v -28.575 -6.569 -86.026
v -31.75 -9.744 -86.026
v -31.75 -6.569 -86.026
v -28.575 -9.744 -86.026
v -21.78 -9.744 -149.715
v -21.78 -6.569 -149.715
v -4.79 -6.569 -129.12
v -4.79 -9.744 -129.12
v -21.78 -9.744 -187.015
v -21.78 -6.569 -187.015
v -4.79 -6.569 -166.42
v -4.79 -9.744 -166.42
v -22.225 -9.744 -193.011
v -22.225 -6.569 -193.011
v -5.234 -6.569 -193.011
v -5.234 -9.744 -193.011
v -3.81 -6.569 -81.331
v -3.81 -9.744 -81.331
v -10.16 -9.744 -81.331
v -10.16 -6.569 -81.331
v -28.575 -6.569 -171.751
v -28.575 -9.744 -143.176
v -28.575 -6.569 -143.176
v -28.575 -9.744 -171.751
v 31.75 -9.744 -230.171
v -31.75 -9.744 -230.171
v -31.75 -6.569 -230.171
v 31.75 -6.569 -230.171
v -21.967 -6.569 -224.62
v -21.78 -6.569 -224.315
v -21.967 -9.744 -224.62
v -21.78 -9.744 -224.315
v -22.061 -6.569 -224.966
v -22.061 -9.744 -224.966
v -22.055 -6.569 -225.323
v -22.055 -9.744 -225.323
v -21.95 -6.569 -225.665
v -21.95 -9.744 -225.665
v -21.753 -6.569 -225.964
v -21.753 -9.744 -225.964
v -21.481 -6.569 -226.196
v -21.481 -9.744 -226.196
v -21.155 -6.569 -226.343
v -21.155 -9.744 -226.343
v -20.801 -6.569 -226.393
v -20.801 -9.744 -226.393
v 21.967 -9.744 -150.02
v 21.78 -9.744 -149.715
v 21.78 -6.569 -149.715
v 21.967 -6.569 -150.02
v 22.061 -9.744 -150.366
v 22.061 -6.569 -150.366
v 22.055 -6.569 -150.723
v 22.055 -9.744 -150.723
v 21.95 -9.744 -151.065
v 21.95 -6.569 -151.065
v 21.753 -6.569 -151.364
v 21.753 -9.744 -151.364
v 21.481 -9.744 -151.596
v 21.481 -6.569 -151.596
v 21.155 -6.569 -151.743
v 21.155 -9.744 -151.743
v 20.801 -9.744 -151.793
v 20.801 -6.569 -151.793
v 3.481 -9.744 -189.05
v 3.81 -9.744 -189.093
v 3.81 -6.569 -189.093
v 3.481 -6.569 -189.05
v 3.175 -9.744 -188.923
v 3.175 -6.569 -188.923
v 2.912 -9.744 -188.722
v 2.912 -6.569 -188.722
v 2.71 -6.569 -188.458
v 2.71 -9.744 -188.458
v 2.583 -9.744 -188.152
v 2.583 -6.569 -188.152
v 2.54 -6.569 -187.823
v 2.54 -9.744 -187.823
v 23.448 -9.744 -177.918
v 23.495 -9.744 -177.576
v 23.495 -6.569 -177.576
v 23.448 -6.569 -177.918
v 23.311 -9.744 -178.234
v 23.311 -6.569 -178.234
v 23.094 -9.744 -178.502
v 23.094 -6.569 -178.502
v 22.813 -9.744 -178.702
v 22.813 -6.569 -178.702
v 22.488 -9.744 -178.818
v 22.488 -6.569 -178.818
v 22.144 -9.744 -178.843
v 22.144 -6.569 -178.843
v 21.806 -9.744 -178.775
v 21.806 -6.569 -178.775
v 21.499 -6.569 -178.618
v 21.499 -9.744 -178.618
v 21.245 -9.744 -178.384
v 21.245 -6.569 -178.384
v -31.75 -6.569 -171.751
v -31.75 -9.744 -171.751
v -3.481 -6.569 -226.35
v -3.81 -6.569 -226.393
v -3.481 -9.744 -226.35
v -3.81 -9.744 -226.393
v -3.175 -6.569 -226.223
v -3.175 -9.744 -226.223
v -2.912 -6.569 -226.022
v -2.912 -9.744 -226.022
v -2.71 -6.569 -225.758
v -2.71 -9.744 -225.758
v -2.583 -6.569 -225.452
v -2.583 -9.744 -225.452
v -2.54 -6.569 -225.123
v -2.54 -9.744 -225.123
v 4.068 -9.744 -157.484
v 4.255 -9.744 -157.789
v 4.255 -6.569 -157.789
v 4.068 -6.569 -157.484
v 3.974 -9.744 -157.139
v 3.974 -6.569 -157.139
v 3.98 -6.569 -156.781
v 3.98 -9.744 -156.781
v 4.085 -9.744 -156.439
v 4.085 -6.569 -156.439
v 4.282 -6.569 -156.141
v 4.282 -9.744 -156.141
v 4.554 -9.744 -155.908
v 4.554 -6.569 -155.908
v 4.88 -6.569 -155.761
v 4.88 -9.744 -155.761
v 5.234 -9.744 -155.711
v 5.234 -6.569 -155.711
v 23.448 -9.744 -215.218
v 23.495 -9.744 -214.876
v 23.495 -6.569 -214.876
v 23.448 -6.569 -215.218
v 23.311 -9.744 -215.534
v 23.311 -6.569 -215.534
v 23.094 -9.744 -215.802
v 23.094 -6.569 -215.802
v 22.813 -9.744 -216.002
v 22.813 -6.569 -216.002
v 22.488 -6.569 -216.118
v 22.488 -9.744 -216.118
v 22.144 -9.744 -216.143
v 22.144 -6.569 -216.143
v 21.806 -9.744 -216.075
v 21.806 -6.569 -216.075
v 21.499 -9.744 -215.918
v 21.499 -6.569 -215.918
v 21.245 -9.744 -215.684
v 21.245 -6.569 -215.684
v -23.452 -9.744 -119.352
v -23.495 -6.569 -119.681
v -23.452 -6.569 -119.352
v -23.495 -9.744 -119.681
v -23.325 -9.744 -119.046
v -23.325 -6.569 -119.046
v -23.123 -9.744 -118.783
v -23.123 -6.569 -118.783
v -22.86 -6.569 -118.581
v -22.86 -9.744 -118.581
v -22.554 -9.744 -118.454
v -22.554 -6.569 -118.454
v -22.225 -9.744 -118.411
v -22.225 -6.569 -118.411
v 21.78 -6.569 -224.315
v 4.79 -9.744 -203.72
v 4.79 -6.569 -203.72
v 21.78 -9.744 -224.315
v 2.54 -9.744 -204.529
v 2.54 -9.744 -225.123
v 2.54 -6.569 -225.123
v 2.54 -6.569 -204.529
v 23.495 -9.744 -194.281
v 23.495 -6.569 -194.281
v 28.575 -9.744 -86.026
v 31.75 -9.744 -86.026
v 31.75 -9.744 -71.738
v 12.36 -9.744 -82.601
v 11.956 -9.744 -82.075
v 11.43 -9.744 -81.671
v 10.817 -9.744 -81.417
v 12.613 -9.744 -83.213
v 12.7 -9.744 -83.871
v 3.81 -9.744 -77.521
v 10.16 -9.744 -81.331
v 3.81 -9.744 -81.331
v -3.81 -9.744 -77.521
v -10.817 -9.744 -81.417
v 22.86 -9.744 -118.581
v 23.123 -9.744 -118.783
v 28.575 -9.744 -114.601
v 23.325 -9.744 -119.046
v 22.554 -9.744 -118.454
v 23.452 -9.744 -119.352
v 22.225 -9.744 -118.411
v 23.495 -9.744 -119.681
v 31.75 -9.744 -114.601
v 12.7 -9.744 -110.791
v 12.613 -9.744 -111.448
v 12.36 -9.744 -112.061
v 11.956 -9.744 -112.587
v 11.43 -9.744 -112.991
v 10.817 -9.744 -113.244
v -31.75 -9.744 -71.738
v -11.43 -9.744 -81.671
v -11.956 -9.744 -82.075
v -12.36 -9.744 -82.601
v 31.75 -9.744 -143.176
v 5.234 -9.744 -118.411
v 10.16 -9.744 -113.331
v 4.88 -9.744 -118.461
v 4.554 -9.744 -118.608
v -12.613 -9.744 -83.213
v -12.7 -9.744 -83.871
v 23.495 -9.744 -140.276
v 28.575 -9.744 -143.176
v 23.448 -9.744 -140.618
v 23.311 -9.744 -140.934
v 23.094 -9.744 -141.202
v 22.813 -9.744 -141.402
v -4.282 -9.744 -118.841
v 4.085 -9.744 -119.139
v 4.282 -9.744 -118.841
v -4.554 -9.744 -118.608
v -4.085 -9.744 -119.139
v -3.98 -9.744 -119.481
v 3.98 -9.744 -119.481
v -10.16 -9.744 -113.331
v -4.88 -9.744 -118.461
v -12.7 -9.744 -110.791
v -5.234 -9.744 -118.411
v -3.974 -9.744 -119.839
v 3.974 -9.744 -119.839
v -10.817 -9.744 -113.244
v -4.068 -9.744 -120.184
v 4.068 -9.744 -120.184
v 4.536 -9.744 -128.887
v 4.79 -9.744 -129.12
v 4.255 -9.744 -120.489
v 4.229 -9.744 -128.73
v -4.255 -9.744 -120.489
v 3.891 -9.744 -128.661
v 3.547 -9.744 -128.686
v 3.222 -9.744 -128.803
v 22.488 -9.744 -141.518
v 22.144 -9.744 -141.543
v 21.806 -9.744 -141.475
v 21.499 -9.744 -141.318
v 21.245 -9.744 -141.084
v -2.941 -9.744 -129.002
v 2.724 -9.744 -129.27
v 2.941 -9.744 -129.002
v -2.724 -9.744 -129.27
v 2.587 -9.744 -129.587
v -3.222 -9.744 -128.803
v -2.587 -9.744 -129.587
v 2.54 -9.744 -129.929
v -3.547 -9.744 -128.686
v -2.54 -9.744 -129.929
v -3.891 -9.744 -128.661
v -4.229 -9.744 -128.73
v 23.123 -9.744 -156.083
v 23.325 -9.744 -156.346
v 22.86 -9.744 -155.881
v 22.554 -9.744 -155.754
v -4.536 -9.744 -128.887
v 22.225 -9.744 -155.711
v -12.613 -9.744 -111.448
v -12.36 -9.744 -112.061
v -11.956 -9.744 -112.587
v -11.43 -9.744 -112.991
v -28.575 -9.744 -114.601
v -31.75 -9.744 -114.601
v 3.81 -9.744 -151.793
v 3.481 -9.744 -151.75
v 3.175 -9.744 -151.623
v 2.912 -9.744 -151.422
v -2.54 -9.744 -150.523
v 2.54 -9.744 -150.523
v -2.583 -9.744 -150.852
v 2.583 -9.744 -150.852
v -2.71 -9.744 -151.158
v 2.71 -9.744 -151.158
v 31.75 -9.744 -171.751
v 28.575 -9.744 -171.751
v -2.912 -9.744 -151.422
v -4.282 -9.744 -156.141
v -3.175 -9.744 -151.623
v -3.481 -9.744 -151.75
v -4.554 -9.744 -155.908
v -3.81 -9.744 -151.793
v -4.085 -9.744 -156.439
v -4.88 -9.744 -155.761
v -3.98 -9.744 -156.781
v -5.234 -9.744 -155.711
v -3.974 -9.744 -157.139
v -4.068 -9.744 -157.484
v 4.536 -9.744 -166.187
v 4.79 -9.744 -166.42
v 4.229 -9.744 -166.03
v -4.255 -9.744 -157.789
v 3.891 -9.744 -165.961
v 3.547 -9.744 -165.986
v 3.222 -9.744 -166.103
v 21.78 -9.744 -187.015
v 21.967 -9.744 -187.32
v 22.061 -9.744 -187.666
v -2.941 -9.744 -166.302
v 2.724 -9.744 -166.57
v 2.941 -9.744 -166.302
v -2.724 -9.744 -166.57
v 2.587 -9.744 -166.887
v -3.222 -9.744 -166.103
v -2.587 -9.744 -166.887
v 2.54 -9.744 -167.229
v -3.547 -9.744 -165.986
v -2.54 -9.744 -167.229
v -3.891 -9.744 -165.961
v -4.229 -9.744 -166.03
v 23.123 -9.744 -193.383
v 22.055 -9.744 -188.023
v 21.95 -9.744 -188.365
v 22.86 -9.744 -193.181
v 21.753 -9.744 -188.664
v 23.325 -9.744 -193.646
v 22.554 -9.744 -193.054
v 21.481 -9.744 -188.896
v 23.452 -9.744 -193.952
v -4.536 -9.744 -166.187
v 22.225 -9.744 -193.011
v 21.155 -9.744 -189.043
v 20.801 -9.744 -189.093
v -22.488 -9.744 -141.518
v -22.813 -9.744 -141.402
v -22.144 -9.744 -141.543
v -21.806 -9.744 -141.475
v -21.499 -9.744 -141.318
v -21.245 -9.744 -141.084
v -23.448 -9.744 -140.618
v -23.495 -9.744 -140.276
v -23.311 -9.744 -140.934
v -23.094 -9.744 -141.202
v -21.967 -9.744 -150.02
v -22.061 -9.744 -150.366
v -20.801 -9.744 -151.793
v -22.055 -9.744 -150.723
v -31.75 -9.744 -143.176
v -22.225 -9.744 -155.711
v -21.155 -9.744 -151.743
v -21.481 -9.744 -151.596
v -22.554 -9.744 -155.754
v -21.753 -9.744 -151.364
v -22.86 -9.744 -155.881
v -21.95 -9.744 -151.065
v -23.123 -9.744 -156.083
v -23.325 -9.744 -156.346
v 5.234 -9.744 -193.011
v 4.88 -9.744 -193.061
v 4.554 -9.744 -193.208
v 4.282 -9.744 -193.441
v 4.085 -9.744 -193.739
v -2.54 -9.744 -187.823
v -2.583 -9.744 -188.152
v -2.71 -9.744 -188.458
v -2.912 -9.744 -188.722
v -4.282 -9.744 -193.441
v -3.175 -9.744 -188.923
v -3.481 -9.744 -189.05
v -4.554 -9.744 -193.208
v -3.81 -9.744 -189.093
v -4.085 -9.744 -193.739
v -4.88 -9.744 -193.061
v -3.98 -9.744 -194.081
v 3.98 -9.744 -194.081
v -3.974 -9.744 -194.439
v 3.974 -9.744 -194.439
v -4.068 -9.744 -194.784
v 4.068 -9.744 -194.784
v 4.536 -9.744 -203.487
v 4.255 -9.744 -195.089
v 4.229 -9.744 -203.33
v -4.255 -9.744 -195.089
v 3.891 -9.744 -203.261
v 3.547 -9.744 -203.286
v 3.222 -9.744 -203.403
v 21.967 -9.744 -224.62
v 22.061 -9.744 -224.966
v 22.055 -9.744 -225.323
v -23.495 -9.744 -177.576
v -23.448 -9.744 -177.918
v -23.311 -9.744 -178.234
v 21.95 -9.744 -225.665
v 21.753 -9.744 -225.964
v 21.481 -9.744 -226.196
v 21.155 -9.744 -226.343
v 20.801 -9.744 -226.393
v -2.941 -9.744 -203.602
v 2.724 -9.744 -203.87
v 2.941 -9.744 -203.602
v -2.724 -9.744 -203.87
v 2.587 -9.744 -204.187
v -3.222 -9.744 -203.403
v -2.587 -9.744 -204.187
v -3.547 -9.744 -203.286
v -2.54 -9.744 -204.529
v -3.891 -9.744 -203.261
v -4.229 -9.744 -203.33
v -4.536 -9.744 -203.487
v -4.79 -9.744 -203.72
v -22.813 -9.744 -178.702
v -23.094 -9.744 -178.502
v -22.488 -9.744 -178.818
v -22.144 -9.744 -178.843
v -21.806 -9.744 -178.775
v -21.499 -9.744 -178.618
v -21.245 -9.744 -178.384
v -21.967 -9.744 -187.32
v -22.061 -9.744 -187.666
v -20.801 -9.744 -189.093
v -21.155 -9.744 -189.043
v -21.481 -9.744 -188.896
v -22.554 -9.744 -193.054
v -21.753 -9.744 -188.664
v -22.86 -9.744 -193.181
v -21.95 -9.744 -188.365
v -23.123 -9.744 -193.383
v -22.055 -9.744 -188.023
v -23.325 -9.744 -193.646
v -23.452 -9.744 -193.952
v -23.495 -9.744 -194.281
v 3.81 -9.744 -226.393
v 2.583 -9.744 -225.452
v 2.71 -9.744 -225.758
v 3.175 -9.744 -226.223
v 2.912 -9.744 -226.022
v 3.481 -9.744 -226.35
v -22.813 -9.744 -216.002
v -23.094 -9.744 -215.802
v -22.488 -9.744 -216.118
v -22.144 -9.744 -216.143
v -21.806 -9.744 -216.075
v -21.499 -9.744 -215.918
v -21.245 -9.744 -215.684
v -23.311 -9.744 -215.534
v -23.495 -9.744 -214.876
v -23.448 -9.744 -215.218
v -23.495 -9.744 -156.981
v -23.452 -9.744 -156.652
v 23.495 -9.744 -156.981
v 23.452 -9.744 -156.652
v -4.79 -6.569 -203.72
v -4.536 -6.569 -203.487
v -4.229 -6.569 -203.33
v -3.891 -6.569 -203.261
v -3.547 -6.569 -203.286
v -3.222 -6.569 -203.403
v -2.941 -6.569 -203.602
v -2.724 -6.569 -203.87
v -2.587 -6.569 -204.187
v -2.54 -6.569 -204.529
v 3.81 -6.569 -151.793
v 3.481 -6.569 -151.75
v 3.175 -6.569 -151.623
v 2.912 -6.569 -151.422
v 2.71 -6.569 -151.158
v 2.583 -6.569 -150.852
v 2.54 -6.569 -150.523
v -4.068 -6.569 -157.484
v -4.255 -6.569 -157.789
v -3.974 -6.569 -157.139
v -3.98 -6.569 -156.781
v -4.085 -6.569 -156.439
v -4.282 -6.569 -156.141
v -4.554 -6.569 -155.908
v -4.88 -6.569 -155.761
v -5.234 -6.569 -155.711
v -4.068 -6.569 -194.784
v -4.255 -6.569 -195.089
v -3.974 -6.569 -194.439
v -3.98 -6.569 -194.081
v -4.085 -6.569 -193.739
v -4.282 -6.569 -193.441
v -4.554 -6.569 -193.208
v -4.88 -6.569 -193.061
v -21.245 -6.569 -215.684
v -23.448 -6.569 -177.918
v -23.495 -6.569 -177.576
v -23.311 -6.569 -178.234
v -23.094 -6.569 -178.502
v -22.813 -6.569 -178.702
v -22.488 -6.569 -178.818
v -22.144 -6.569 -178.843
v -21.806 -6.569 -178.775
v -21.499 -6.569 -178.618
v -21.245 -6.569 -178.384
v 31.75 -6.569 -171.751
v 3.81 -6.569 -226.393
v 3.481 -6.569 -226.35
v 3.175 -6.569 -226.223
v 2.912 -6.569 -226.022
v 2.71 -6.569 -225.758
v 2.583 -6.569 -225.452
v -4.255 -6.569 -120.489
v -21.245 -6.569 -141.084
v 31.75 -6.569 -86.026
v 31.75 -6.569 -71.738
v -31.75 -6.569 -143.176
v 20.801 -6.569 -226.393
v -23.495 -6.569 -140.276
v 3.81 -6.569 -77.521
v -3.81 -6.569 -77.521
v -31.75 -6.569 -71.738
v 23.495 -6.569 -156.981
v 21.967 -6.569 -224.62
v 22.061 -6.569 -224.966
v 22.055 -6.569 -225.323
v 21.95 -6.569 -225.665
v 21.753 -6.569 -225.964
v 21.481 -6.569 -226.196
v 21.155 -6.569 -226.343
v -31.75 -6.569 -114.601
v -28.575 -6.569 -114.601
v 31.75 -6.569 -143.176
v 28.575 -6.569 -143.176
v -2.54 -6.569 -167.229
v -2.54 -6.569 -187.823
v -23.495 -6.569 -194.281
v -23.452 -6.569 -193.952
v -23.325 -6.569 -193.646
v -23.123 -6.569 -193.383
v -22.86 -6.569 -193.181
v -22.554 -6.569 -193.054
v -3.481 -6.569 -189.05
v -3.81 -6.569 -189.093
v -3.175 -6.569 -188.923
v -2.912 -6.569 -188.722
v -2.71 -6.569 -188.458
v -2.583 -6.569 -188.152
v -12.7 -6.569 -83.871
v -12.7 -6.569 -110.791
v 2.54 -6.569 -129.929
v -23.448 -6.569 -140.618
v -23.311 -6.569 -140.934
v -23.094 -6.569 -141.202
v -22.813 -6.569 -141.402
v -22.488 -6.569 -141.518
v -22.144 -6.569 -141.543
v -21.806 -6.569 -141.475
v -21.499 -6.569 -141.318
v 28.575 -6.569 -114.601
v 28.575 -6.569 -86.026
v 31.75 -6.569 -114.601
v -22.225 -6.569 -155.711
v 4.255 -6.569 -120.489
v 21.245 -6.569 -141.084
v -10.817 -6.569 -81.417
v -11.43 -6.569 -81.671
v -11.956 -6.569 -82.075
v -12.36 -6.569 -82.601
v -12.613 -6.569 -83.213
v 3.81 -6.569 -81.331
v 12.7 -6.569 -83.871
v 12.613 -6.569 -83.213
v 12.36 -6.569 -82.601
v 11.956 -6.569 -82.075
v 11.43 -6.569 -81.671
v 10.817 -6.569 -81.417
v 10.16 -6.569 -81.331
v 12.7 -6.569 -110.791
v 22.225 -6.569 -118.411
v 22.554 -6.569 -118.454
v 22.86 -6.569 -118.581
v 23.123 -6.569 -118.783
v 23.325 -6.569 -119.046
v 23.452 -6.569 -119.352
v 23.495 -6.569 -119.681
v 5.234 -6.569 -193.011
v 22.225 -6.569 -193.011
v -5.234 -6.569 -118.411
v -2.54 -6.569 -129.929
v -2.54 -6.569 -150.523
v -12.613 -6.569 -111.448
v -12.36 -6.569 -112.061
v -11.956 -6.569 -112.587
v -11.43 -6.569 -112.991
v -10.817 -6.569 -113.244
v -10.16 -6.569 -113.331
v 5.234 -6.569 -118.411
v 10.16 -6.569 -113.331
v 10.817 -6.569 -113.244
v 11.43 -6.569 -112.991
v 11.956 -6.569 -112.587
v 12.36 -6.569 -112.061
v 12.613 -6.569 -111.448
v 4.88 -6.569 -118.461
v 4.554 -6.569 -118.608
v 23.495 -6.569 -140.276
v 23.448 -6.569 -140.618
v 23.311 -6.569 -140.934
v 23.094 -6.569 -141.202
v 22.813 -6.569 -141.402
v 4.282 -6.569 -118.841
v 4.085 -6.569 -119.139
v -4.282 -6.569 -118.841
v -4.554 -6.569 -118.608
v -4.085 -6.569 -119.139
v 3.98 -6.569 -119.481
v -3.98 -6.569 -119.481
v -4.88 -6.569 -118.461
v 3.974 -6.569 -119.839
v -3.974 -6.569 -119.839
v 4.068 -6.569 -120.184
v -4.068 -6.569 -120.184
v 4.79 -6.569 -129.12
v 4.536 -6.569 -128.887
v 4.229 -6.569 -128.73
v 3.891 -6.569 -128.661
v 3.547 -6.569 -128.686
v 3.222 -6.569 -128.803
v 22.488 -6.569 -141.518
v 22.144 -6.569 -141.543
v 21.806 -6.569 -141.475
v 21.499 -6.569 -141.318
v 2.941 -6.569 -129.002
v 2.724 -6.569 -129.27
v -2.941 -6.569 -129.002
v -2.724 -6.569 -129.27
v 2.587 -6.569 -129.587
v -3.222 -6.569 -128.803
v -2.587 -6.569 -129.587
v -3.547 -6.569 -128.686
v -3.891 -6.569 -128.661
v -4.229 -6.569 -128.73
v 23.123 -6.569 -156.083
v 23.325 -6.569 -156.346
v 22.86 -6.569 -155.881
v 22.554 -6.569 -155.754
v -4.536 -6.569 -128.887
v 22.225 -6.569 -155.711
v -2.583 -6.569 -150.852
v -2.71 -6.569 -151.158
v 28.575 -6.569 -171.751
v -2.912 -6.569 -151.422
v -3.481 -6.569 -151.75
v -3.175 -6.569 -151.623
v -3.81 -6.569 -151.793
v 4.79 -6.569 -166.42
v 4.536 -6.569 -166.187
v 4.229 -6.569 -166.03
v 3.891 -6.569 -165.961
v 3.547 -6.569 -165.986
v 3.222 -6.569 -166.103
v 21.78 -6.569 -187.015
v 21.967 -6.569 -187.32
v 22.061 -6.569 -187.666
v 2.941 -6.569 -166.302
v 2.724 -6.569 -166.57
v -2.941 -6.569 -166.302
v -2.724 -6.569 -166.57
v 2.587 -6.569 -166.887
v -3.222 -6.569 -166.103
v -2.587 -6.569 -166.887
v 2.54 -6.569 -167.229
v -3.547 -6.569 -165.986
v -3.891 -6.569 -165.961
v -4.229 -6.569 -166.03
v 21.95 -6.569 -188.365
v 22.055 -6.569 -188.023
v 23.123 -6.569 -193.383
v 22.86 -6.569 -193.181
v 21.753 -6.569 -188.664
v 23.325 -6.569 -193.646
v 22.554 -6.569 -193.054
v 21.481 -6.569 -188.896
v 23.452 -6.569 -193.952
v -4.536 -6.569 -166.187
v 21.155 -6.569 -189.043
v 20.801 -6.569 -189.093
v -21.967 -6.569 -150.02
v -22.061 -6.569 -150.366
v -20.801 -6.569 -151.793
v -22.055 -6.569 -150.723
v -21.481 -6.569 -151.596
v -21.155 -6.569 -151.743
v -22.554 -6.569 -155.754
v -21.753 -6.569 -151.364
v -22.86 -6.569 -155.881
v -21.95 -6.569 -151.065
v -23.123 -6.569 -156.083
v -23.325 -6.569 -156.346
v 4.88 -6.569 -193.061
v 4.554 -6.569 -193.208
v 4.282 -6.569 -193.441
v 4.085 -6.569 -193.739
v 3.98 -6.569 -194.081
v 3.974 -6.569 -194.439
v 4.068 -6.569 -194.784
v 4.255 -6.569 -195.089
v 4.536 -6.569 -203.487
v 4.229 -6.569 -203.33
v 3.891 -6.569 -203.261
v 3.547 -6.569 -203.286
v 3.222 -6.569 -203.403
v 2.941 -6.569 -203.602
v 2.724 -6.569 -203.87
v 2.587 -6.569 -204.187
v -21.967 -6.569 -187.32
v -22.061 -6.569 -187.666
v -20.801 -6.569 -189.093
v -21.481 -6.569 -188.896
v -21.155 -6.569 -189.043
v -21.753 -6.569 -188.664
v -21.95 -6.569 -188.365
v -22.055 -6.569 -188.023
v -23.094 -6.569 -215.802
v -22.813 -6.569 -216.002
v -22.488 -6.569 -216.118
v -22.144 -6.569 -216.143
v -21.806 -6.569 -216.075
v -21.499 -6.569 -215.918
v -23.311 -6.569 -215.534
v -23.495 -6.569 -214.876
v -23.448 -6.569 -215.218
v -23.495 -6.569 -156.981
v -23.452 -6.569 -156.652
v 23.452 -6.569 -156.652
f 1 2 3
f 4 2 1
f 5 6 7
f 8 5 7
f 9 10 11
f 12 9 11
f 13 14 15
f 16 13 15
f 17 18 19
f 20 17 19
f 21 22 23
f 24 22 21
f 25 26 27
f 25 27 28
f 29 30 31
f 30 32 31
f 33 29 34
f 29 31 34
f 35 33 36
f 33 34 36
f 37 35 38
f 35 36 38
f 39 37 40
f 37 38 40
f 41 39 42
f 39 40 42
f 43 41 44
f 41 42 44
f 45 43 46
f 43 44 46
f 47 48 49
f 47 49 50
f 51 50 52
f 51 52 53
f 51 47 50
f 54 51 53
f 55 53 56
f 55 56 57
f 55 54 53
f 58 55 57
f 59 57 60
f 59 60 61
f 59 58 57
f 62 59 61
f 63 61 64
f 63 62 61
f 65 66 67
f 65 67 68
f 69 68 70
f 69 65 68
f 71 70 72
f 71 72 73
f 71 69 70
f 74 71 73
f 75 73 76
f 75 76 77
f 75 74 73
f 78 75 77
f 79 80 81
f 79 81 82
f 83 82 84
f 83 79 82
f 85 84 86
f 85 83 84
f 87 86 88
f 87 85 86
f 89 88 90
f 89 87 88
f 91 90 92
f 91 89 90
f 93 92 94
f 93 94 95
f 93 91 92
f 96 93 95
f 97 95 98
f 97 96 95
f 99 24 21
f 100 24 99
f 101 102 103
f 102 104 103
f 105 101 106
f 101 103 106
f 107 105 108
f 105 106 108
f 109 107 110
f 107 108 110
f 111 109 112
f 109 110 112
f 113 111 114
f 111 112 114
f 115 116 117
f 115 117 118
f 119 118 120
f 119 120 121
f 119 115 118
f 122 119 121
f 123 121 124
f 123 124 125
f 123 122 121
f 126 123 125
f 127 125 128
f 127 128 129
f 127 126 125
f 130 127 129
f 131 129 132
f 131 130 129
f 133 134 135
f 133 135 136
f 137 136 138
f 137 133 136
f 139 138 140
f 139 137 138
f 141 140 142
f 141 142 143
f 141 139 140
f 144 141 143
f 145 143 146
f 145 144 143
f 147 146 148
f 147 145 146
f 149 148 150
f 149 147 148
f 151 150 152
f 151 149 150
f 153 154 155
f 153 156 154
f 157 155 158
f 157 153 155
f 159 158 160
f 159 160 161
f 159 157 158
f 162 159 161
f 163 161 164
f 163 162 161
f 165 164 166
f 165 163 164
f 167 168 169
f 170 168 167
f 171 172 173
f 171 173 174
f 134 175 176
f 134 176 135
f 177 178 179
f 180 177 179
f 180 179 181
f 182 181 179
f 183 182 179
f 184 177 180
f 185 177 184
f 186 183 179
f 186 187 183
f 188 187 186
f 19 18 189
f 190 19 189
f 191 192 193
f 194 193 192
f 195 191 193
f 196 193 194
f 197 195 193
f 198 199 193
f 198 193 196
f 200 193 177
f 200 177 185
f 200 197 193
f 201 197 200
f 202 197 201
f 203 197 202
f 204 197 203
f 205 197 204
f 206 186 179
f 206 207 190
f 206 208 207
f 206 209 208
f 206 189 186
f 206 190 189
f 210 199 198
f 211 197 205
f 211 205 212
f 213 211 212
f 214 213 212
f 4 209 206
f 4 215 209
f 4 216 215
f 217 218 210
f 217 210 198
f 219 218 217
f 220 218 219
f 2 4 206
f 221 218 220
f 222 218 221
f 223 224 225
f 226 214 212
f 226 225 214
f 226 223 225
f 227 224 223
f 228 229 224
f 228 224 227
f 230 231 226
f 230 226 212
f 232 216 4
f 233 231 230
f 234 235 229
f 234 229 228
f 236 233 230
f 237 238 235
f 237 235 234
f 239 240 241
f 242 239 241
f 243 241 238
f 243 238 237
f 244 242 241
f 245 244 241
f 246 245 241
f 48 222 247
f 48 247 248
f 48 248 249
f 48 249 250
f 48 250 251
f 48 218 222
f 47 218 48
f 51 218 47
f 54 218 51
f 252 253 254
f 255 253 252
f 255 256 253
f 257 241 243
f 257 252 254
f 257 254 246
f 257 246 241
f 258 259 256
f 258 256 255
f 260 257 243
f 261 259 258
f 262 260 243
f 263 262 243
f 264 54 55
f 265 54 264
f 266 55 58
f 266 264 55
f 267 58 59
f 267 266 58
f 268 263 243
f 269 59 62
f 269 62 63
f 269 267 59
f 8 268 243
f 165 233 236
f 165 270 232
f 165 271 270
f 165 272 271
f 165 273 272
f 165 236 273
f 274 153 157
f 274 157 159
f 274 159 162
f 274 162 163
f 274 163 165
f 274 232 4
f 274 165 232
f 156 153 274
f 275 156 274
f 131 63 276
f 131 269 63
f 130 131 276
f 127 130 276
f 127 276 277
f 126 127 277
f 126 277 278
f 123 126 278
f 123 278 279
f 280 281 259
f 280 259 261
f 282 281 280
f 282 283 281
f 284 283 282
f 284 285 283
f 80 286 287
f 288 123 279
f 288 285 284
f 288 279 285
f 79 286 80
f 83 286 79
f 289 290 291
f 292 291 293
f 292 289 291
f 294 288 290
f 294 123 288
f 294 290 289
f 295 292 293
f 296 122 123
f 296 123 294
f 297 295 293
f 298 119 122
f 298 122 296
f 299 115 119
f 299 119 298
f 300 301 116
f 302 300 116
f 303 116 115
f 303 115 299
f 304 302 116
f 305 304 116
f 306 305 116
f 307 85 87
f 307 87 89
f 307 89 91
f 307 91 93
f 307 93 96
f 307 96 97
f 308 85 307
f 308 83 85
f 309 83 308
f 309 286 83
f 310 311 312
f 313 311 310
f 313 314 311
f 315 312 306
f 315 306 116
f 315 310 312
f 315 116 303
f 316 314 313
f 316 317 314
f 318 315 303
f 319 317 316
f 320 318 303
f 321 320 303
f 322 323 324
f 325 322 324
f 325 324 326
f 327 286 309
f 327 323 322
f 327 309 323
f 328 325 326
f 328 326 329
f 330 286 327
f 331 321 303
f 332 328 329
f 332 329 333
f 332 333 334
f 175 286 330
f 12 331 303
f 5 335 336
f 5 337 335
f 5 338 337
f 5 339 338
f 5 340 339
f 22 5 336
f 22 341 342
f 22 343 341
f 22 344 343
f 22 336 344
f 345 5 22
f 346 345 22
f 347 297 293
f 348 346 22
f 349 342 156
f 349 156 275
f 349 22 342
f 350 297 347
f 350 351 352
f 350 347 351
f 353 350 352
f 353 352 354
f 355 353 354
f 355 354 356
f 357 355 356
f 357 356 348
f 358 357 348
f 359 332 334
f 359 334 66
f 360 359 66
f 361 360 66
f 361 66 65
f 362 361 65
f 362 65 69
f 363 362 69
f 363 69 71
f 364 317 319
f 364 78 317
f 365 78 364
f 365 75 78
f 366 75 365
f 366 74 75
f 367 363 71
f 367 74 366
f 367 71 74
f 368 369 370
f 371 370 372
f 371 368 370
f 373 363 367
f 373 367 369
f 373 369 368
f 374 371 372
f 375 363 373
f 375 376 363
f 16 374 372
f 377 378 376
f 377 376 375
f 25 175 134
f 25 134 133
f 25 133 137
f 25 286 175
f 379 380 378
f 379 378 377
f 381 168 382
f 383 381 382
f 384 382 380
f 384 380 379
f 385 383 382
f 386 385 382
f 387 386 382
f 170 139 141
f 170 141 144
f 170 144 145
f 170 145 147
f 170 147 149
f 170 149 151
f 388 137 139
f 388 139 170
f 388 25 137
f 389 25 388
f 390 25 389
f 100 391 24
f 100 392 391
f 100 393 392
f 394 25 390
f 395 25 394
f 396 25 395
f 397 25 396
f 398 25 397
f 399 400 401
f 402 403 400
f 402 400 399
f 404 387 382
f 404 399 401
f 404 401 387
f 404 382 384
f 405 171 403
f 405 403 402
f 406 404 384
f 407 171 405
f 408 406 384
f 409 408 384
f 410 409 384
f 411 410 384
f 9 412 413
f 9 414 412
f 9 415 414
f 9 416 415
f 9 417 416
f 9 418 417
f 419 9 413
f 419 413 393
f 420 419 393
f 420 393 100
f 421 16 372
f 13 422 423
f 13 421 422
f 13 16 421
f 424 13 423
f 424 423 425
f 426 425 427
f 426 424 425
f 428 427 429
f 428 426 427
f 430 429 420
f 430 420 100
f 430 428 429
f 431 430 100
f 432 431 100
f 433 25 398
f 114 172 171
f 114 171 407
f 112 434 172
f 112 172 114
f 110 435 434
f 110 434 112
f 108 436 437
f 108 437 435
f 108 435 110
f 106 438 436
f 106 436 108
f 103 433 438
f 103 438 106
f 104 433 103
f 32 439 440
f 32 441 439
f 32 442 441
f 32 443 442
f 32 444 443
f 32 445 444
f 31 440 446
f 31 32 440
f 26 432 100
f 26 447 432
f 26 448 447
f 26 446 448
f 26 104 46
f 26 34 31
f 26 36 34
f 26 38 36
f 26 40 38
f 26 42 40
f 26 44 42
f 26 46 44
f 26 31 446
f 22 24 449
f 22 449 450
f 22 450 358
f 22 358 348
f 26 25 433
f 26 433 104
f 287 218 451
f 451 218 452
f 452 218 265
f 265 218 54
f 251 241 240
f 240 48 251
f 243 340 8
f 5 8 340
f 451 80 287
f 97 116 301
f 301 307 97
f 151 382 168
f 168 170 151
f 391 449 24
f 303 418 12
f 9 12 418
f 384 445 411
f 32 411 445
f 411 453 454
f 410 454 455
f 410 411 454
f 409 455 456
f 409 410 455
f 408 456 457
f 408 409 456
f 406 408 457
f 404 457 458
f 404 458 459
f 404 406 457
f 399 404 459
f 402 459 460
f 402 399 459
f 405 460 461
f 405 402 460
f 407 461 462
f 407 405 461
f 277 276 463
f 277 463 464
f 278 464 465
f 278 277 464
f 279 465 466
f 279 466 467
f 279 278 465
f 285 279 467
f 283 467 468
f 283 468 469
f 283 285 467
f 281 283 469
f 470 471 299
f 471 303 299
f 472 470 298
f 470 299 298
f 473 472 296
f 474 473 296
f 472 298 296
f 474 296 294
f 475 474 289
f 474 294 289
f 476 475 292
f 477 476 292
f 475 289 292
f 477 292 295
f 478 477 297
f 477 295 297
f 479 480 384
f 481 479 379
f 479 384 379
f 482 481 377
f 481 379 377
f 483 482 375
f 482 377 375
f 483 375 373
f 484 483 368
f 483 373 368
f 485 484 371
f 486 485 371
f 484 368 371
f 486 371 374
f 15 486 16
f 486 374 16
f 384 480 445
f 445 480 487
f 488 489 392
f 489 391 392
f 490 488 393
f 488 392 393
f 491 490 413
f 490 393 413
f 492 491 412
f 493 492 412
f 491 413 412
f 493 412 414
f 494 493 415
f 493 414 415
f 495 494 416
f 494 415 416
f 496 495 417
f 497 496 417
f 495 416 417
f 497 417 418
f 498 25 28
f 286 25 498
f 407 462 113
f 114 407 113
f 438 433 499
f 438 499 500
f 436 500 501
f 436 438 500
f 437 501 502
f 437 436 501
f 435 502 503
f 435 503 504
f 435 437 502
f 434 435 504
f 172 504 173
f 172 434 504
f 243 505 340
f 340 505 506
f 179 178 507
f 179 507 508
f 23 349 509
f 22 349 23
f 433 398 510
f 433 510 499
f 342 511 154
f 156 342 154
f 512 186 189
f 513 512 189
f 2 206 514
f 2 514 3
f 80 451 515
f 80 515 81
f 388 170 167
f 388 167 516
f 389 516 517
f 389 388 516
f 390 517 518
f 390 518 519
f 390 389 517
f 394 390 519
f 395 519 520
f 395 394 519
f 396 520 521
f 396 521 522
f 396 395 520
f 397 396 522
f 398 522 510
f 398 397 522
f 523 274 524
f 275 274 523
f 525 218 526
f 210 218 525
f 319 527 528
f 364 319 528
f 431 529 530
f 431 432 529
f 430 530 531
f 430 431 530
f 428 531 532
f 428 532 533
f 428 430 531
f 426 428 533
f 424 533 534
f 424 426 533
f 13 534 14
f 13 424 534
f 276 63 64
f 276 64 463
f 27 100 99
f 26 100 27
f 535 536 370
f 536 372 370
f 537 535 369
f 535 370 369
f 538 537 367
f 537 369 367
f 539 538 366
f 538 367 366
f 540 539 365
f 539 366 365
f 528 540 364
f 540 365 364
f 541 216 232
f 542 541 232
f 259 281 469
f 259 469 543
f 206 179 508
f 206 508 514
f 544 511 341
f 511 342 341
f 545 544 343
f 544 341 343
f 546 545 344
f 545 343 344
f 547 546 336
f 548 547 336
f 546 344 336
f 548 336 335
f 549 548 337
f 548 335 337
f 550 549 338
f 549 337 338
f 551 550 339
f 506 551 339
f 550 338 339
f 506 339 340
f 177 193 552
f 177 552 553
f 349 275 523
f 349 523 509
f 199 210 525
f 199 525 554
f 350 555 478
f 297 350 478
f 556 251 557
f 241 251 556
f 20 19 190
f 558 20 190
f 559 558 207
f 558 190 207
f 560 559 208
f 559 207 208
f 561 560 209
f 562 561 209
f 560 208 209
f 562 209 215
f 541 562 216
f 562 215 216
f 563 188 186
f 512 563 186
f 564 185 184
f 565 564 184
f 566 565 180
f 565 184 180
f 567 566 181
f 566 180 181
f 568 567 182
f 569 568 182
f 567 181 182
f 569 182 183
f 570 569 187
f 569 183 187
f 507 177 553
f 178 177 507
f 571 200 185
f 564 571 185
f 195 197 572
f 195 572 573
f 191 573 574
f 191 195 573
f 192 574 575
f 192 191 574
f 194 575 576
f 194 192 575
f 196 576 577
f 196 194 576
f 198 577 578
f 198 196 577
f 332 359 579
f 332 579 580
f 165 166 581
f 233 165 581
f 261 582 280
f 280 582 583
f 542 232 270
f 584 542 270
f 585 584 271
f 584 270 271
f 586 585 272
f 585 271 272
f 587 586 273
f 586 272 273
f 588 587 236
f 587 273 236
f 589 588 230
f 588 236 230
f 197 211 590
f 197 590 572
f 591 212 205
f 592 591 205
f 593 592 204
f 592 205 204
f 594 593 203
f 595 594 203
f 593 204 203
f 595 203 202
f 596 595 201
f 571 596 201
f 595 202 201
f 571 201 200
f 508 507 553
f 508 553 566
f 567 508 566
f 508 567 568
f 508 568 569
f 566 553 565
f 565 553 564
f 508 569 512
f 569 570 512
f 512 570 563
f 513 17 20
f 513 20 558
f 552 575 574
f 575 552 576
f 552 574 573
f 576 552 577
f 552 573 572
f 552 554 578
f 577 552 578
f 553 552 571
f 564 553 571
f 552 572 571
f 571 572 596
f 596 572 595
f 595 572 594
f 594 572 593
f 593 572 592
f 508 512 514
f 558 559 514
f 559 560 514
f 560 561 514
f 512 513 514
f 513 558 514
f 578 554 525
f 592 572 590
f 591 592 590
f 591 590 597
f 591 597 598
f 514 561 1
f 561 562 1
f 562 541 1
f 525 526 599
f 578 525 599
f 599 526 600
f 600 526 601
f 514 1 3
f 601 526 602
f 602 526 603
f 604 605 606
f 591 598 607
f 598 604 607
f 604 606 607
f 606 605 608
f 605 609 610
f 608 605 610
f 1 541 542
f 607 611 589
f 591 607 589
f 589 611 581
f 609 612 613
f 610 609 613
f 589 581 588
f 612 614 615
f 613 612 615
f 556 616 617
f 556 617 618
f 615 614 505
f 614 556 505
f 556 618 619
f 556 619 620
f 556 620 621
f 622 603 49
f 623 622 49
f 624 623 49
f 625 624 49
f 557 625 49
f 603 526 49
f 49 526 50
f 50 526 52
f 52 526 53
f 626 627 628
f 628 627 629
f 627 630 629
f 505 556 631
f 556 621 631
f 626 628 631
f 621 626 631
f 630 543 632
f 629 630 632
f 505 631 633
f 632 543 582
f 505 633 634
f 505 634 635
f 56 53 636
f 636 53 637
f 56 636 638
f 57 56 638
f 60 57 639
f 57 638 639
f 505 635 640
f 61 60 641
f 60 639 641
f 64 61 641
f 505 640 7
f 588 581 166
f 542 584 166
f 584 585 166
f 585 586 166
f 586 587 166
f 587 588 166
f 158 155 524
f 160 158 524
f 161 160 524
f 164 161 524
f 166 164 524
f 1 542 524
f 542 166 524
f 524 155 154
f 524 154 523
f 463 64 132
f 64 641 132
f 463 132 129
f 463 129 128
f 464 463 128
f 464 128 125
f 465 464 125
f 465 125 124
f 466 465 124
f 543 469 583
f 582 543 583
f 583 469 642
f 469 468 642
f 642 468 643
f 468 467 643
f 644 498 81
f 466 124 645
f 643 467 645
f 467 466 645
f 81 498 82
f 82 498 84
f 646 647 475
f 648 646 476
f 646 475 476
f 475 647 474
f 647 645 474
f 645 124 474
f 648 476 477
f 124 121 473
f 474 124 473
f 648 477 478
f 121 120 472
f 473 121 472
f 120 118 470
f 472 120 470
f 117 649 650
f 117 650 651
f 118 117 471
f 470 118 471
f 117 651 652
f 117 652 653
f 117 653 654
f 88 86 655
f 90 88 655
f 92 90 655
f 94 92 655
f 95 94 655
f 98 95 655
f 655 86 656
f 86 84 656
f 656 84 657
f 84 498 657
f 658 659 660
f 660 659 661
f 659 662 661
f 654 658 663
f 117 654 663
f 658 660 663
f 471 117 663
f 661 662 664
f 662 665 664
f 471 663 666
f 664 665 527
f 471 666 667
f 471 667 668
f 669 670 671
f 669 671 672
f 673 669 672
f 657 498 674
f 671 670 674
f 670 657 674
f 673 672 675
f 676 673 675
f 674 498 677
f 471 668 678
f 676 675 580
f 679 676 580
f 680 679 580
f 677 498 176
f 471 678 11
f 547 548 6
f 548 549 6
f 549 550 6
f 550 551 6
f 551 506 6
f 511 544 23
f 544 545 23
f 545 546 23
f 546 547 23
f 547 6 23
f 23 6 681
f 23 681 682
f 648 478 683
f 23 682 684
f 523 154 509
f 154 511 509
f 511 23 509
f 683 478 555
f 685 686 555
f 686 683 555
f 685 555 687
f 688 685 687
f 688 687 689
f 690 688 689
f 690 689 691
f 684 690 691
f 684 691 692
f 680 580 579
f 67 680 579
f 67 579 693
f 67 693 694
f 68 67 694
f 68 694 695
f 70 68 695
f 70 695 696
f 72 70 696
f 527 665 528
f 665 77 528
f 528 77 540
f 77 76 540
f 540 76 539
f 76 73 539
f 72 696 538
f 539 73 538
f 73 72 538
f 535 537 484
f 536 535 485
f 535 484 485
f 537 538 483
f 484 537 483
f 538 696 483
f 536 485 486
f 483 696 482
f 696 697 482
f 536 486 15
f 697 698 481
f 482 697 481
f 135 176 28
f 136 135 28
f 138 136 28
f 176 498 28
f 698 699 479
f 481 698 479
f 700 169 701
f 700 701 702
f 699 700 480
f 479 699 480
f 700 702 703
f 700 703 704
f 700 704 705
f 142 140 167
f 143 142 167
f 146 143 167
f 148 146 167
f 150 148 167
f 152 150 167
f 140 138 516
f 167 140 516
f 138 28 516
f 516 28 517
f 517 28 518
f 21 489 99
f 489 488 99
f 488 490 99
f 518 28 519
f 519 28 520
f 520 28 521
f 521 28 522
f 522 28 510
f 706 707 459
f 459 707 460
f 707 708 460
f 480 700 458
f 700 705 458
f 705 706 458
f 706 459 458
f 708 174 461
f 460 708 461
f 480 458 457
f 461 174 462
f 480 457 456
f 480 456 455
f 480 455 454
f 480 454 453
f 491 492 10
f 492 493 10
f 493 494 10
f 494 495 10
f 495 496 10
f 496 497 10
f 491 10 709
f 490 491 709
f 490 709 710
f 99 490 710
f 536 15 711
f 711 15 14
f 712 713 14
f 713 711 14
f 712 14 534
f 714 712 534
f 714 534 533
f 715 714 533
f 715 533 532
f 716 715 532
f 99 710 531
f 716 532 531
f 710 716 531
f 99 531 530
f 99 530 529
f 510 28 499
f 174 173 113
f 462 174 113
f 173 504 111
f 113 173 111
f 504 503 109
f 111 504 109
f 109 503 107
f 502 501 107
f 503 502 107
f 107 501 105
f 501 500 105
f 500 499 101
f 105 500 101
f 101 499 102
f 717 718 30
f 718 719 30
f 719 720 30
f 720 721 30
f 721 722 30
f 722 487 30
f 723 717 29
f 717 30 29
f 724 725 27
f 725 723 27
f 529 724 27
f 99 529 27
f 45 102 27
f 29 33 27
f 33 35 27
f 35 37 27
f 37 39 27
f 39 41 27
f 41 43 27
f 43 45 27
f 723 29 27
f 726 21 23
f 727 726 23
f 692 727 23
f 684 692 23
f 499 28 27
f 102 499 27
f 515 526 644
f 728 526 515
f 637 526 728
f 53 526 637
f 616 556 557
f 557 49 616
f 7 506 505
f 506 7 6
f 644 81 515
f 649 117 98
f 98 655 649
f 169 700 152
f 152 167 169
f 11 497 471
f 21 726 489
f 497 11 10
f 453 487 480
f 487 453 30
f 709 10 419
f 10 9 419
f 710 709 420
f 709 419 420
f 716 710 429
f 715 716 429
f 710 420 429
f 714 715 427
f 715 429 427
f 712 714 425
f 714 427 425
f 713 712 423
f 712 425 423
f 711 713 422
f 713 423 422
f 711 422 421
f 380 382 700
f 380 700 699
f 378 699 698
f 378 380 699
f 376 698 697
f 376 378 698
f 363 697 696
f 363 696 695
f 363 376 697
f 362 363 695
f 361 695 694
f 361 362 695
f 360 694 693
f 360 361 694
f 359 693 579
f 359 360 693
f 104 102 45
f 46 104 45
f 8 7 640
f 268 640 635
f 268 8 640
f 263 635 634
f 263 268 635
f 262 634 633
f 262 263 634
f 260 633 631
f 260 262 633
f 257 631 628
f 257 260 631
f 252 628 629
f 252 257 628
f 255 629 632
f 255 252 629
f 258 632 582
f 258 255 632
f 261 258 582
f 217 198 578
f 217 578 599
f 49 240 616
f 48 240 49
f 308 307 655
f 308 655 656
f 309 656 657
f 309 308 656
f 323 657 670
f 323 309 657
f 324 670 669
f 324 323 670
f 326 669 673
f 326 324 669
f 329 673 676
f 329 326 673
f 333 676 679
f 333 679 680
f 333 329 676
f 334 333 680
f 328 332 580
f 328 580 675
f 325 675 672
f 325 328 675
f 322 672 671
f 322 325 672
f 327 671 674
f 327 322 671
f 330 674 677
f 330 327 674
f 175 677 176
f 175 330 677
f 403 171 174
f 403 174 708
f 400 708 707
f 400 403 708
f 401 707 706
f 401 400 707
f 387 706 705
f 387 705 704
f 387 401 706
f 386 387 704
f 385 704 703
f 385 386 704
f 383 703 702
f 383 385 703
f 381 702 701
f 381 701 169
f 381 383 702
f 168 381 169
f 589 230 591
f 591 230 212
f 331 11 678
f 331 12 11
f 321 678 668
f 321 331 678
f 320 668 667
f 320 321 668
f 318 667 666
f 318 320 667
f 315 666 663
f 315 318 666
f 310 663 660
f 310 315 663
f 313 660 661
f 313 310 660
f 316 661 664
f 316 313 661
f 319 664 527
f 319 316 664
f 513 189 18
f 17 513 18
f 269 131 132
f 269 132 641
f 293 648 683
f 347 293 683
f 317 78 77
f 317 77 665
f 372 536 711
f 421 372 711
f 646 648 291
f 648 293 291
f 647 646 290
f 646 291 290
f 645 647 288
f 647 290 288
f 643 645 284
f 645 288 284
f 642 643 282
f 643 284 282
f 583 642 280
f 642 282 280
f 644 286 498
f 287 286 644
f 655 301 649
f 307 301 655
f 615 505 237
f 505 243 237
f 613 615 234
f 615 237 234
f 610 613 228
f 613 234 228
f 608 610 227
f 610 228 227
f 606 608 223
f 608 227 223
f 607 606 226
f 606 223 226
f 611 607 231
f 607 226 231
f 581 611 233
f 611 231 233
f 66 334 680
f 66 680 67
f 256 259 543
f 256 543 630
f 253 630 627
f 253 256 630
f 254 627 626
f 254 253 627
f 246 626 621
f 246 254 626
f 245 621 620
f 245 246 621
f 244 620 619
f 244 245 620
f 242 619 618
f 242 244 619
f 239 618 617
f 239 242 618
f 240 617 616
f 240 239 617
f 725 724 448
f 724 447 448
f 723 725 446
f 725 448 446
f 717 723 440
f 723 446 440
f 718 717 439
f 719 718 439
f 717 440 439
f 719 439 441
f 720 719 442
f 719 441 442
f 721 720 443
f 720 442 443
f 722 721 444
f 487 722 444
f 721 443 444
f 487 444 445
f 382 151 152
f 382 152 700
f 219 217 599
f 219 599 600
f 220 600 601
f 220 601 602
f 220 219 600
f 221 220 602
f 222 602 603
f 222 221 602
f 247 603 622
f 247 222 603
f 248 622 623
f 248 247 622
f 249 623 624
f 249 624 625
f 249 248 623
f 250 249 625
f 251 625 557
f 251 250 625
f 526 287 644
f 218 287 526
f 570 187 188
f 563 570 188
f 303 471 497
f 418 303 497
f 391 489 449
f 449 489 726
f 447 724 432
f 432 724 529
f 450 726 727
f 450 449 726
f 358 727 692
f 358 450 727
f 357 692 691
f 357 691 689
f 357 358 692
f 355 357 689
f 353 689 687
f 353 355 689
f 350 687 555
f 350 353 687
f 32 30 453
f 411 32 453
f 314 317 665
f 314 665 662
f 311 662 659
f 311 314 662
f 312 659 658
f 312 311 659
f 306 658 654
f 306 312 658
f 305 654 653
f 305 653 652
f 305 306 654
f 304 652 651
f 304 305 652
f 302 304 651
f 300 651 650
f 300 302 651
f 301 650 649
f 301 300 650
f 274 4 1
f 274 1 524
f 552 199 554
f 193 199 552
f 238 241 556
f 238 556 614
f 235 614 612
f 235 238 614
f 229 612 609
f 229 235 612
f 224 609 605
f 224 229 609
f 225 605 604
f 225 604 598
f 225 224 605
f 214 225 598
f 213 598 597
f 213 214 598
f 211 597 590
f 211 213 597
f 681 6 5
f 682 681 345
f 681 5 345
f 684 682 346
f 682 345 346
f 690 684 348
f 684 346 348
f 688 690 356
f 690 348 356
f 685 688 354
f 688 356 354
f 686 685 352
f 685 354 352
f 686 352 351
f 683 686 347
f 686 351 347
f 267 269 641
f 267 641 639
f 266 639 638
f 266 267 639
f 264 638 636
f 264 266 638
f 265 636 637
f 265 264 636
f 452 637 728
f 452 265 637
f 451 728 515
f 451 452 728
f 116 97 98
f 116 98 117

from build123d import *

# Parameters (mm, degrees)
BOSS_EXTRUDE1_DEPTH    = 3.175
CUT_EXTRUDE1_DEPTH     = 233.372048712
FILLET1_R              = 1.27
LPATTERN1_COUNT        = 3
LPATTERN1_PITCH        = 37.3
FILLET1_OF_LPATTERN1_R = 1.27
MIRROR1_START          = -9.743731804
MIRROR1_DEPTH          = 3.175


# Read off the part's stored shape, not the designer's step: Mirror1
with BuildPart() as part:
    # Sketch1 → Boss-Extrude1 (new body)
    with BuildSketch(Plane(origin=(0, -9.743731804, 0), x_dir=(1, 0, 0), z_dir=(0, 1, 0))):
        Polygon((-31.75, 143.175862399), (-28.575, 143.175862399), (-28.575, 171.750862399), (-31.75, 171.750862399), (-31.75, 230.170862399), (31.75, 230.170862399), (31.75, 171.750862399), (28.575, 171.750862399), (28.575, 143.175862399), (31.75, 143.175862399), (31.75, 114.600862399), (28.575, 114.600862399), (28.575, 86.025862399), (31.75, 86.025862399), (31.75, 71.738362399), (-31.75, 71.738362399), (-31.75, 86.025862399), (-28.575, 86.025862399), (-28.575, 114.600862399), (-31.75, 114.600862399), align=None)
        with BuildLine():
            Line((-10.16, 113.330862399), (10.16, 113.330862399))
            ThreePointArc((10.16, 113.330862399), (11.956051224, 112.586913623), (12.7, 110.790862399))
            Line((12.7, 110.790862399), (12.7, 83.870862391))
            ThreePointArc((12.7, 83.870862391), (11.956051224, 82.074811167), (10.16, 81.330862391))
            Line((10.16, 81.330862391), (3.81, 81.330862391))
            Line((3.81, 81.330862391), (3.81, 77.520862391))
            Line((3.81, 77.520862391), (-3.81, 77.520862391))
            Line((-3.81, 77.520862391), (-3.81, 81.330862391))
            Line((-3.81, 81.330862391), (-10.16, 81.330862391))
            ThreePointArc((-10.16, 81.330862391), (-11.956051224, 82.074811167), (-12.7, 83.870862391))
            Line((-12.7, 83.870862391), (-12.7, 110.790862399))
            ThreePointArc((-12.7, 110.790862399), (-11.956051224, 112.586913623), (-10.16, 113.330862399))
        make_face(mode=Mode.SUBTRACT)
    extrude(amount=BOSS_EXTRUDE1_DEPTH)

    # Sketch2 → Cut-Extrude1 (cut, through all)
    with BuildSketch(Plane(origin=(0, -6.568731804, 0), x_dir=(1, 0, 0), z_dir=(0, 1, 0))):
        Polygon((-23.495, 143.810862399), (-23.495, 118.410862399), (-2.54, 118.410862399), align=None)
        Polygon((-23.495, 151.793477209), (-2.54, 126.393477209), (-2.54, 151.793477209), align=None)
    cut_extrude1 = extrude(amount=-CUT_EXTRUDE1_DEPTH, mode=Mode.SUBTRACT)

    # Fillet1
    fillet1_edges = [part.edges().sort_by_distance(p)[0] for p in [
        (-23.495, -8.156231804, -151.793477209),
        (-2.54, -8.156231804, -151.793477209),
        (-2.54, -8.156231804, -126.393477209),
        (-23.495, -8.156231804, -143.810862399),
        (-2.54, -8.156231804, -118.410862399),
        (-23.495, -8.156231804, -118.410862399),
    ]]
    fillet(fillet1_edges, radius=FILLET1_R)

    # LPattern1: Cut-Extrude1 ×3
    with Locations(*[(0, 0, -i * LPATTERN1_PITCH) for i in range(1, LPATTERN1_COUNT)]):
        add(cut_extrude1, mode=Mode.SUBTRACT)

    # Fillet1 of LPattern1
    fillet1_of_lpattern1_edges = [part.edges().sort_by_distance(p)[0] for p in [
        (-23.495, -8.156231804, -189.093477209),
        (-2.54, -8.156231804, -189.093477209),
        (-2.54, -8.156231804, -163.693477209),
        (-23.495, -8.156231804, -181.110862399),
        (-2.54, -8.156231804, -155.710862399),
        (-23.495, -8.156231804, -155.710862399),
        (-23.495, -8.156231804, -226.393477209),
        (-2.54, -8.156231804, -226.393477209),
        (-2.54, -8.156231804, -200.993477209),
        (-23.495, -8.156231804, -218.410862399),
        (-2.54, -8.156231804, -193.010862399),
        (-23.495, -8.156231804, -193.010862399),
    ]]
    fillet(fillet1_of_lpattern1_edges, radius=FILLET1_OF_LPATTERN1_R)

    # Mirror1 outline → Mirror1 (cut)
    with BuildSketch(Plane(origin=(0, 0, 0), x_dir=(1, 0, 0), z_dir=(0, 1, 0)).offset(MIRROR1_START)):
        with BuildLine():
            Line((20.800835695, 226.393477209), (3.81, 226.393477209))
            ThreePointArc((3.81, 226.393477209), (2.911974388, 226.021502821), (2.54, 225.123477209))
            Line((2.54, 225.123477209), (2.54, 204.528524851))
            ThreePointArc((2.54, 204.528524851), (3.380609712, 203.333316091), (4.789644064, 203.720318499))
            Line((4.789644064, 203.720318499), (21.780479759, 224.315270857))
            ThreePointArc((21.780479759, 224.315270857), (21.949600699, 225.664992644), (20.800835695, 226.393477209))
        make_face()
        with BuildLine():
            Line((5.234164305, 193.010862399), (22.225, 193.010862399))
            ThreePointArc((22.225, 193.010862399), (23.123025612, 193.382836787), (23.495, 194.280862399))
            Line((23.495, 194.280862399), (23.495, 214.875814757))
            ThreePointArc((23.495, 214.875814757), (22.654390288, 216.071023517), (21.245355936, 215.68402111))
            Line((21.245355936, 215.68402111), (4.254520241, 195.089068752))
            ThreePointArc((4.254520241, 195.089068752), (4.085399301, 193.739346964), (5.234164305, 193.010862399))
        make_face()
        with BuildLine():
            Line((5.234164305, 118.410862399), (22.225, 118.410862399))
            ThreePointArc((22.225, 118.410862399), (23.123025612, 118.782836787), (23.495, 119.680862399))
            Line((23.495, 119.680862399), (23.495, 140.275814757))
            ThreePointArc((23.495, 140.275814757), (22.654390288, 141.471023517), (21.245355936, 141.08402111))
            Line((21.245355936, 141.08402111), (4.254520241, 120.489068752))
            ThreePointArc((4.254520241, 120.489068752), (4.085399301, 119.139346964), (5.234164305, 118.410862399))
        make_face()
        with BuildLine():
            Line((20.800835695, 151.793477209), (3.81, 151.793477209))
            ThreePointArc((3.81, 151.793477209), (2.911974388, 151.421502821), (2.54, 150.523477209))
            Line((2.54, 150.523477209), (2.54, 129.928524851))
            ThreePointArc((2.54, 129.928524851), (3.380609712, 128.733316091), (4.789644064, 129.120318499))
            Line((4.789644064, 129.120318499), (21.780479759, 149.715270857))
            ThreePointArc((21.780479759, 149.715270857), (21.949600699, 151.064992644), (20.800835695, 151.793477209))
        make_face()
        with BuildLine():
            Line((5.234164305, 155.710862399), (22.225, 155.710862399))
            ThreePointArc((22.225, 155.710862399), (23.123025612, 156.082836787), (23.495, 156.980862399))
            Line((23.495, 156.980862399), (23.495, 177.575814757))
            ThreePointArc((23.495, 177.575814757), (22.654390288, 178.771023517), (21.245355936, 178.38402111))
            Line((21.245355936, 178.38402111), (4.254520241, 157.789068752))
            ThreePointArc((4.254520241, 157.789068752), (4.085399301, 156.439346964), (5.234164305, 155.710862399))
        make_face()
        with BuildLine():
            Line((20.800835695, 189.093477209), (3.81, 189.093477209))
            ThreePointArc((3.81, 189.093477209), (2.911974388, 188.721502821), (2.54, 187.823477209))
            Line((2.54, 187.823477209), (2.54, 167.228524851))
            ThreePointArc((2.54, 167.228524851), (3.380609712, 166.033316091), (4.789644064, 166.420318499))
            Line((4.789644064, 166.420318499), (21.780479759, 187.015270857))
            ThreePointArc((21.780479759, 187.015270857), (21.949600699, 188.364992644), (20.800835695, 189.093477209))
        make_face()
    extrude(amount=MIRROR1_DEPTH, mode=Mode.SUBTRACT)


solid = part.part
